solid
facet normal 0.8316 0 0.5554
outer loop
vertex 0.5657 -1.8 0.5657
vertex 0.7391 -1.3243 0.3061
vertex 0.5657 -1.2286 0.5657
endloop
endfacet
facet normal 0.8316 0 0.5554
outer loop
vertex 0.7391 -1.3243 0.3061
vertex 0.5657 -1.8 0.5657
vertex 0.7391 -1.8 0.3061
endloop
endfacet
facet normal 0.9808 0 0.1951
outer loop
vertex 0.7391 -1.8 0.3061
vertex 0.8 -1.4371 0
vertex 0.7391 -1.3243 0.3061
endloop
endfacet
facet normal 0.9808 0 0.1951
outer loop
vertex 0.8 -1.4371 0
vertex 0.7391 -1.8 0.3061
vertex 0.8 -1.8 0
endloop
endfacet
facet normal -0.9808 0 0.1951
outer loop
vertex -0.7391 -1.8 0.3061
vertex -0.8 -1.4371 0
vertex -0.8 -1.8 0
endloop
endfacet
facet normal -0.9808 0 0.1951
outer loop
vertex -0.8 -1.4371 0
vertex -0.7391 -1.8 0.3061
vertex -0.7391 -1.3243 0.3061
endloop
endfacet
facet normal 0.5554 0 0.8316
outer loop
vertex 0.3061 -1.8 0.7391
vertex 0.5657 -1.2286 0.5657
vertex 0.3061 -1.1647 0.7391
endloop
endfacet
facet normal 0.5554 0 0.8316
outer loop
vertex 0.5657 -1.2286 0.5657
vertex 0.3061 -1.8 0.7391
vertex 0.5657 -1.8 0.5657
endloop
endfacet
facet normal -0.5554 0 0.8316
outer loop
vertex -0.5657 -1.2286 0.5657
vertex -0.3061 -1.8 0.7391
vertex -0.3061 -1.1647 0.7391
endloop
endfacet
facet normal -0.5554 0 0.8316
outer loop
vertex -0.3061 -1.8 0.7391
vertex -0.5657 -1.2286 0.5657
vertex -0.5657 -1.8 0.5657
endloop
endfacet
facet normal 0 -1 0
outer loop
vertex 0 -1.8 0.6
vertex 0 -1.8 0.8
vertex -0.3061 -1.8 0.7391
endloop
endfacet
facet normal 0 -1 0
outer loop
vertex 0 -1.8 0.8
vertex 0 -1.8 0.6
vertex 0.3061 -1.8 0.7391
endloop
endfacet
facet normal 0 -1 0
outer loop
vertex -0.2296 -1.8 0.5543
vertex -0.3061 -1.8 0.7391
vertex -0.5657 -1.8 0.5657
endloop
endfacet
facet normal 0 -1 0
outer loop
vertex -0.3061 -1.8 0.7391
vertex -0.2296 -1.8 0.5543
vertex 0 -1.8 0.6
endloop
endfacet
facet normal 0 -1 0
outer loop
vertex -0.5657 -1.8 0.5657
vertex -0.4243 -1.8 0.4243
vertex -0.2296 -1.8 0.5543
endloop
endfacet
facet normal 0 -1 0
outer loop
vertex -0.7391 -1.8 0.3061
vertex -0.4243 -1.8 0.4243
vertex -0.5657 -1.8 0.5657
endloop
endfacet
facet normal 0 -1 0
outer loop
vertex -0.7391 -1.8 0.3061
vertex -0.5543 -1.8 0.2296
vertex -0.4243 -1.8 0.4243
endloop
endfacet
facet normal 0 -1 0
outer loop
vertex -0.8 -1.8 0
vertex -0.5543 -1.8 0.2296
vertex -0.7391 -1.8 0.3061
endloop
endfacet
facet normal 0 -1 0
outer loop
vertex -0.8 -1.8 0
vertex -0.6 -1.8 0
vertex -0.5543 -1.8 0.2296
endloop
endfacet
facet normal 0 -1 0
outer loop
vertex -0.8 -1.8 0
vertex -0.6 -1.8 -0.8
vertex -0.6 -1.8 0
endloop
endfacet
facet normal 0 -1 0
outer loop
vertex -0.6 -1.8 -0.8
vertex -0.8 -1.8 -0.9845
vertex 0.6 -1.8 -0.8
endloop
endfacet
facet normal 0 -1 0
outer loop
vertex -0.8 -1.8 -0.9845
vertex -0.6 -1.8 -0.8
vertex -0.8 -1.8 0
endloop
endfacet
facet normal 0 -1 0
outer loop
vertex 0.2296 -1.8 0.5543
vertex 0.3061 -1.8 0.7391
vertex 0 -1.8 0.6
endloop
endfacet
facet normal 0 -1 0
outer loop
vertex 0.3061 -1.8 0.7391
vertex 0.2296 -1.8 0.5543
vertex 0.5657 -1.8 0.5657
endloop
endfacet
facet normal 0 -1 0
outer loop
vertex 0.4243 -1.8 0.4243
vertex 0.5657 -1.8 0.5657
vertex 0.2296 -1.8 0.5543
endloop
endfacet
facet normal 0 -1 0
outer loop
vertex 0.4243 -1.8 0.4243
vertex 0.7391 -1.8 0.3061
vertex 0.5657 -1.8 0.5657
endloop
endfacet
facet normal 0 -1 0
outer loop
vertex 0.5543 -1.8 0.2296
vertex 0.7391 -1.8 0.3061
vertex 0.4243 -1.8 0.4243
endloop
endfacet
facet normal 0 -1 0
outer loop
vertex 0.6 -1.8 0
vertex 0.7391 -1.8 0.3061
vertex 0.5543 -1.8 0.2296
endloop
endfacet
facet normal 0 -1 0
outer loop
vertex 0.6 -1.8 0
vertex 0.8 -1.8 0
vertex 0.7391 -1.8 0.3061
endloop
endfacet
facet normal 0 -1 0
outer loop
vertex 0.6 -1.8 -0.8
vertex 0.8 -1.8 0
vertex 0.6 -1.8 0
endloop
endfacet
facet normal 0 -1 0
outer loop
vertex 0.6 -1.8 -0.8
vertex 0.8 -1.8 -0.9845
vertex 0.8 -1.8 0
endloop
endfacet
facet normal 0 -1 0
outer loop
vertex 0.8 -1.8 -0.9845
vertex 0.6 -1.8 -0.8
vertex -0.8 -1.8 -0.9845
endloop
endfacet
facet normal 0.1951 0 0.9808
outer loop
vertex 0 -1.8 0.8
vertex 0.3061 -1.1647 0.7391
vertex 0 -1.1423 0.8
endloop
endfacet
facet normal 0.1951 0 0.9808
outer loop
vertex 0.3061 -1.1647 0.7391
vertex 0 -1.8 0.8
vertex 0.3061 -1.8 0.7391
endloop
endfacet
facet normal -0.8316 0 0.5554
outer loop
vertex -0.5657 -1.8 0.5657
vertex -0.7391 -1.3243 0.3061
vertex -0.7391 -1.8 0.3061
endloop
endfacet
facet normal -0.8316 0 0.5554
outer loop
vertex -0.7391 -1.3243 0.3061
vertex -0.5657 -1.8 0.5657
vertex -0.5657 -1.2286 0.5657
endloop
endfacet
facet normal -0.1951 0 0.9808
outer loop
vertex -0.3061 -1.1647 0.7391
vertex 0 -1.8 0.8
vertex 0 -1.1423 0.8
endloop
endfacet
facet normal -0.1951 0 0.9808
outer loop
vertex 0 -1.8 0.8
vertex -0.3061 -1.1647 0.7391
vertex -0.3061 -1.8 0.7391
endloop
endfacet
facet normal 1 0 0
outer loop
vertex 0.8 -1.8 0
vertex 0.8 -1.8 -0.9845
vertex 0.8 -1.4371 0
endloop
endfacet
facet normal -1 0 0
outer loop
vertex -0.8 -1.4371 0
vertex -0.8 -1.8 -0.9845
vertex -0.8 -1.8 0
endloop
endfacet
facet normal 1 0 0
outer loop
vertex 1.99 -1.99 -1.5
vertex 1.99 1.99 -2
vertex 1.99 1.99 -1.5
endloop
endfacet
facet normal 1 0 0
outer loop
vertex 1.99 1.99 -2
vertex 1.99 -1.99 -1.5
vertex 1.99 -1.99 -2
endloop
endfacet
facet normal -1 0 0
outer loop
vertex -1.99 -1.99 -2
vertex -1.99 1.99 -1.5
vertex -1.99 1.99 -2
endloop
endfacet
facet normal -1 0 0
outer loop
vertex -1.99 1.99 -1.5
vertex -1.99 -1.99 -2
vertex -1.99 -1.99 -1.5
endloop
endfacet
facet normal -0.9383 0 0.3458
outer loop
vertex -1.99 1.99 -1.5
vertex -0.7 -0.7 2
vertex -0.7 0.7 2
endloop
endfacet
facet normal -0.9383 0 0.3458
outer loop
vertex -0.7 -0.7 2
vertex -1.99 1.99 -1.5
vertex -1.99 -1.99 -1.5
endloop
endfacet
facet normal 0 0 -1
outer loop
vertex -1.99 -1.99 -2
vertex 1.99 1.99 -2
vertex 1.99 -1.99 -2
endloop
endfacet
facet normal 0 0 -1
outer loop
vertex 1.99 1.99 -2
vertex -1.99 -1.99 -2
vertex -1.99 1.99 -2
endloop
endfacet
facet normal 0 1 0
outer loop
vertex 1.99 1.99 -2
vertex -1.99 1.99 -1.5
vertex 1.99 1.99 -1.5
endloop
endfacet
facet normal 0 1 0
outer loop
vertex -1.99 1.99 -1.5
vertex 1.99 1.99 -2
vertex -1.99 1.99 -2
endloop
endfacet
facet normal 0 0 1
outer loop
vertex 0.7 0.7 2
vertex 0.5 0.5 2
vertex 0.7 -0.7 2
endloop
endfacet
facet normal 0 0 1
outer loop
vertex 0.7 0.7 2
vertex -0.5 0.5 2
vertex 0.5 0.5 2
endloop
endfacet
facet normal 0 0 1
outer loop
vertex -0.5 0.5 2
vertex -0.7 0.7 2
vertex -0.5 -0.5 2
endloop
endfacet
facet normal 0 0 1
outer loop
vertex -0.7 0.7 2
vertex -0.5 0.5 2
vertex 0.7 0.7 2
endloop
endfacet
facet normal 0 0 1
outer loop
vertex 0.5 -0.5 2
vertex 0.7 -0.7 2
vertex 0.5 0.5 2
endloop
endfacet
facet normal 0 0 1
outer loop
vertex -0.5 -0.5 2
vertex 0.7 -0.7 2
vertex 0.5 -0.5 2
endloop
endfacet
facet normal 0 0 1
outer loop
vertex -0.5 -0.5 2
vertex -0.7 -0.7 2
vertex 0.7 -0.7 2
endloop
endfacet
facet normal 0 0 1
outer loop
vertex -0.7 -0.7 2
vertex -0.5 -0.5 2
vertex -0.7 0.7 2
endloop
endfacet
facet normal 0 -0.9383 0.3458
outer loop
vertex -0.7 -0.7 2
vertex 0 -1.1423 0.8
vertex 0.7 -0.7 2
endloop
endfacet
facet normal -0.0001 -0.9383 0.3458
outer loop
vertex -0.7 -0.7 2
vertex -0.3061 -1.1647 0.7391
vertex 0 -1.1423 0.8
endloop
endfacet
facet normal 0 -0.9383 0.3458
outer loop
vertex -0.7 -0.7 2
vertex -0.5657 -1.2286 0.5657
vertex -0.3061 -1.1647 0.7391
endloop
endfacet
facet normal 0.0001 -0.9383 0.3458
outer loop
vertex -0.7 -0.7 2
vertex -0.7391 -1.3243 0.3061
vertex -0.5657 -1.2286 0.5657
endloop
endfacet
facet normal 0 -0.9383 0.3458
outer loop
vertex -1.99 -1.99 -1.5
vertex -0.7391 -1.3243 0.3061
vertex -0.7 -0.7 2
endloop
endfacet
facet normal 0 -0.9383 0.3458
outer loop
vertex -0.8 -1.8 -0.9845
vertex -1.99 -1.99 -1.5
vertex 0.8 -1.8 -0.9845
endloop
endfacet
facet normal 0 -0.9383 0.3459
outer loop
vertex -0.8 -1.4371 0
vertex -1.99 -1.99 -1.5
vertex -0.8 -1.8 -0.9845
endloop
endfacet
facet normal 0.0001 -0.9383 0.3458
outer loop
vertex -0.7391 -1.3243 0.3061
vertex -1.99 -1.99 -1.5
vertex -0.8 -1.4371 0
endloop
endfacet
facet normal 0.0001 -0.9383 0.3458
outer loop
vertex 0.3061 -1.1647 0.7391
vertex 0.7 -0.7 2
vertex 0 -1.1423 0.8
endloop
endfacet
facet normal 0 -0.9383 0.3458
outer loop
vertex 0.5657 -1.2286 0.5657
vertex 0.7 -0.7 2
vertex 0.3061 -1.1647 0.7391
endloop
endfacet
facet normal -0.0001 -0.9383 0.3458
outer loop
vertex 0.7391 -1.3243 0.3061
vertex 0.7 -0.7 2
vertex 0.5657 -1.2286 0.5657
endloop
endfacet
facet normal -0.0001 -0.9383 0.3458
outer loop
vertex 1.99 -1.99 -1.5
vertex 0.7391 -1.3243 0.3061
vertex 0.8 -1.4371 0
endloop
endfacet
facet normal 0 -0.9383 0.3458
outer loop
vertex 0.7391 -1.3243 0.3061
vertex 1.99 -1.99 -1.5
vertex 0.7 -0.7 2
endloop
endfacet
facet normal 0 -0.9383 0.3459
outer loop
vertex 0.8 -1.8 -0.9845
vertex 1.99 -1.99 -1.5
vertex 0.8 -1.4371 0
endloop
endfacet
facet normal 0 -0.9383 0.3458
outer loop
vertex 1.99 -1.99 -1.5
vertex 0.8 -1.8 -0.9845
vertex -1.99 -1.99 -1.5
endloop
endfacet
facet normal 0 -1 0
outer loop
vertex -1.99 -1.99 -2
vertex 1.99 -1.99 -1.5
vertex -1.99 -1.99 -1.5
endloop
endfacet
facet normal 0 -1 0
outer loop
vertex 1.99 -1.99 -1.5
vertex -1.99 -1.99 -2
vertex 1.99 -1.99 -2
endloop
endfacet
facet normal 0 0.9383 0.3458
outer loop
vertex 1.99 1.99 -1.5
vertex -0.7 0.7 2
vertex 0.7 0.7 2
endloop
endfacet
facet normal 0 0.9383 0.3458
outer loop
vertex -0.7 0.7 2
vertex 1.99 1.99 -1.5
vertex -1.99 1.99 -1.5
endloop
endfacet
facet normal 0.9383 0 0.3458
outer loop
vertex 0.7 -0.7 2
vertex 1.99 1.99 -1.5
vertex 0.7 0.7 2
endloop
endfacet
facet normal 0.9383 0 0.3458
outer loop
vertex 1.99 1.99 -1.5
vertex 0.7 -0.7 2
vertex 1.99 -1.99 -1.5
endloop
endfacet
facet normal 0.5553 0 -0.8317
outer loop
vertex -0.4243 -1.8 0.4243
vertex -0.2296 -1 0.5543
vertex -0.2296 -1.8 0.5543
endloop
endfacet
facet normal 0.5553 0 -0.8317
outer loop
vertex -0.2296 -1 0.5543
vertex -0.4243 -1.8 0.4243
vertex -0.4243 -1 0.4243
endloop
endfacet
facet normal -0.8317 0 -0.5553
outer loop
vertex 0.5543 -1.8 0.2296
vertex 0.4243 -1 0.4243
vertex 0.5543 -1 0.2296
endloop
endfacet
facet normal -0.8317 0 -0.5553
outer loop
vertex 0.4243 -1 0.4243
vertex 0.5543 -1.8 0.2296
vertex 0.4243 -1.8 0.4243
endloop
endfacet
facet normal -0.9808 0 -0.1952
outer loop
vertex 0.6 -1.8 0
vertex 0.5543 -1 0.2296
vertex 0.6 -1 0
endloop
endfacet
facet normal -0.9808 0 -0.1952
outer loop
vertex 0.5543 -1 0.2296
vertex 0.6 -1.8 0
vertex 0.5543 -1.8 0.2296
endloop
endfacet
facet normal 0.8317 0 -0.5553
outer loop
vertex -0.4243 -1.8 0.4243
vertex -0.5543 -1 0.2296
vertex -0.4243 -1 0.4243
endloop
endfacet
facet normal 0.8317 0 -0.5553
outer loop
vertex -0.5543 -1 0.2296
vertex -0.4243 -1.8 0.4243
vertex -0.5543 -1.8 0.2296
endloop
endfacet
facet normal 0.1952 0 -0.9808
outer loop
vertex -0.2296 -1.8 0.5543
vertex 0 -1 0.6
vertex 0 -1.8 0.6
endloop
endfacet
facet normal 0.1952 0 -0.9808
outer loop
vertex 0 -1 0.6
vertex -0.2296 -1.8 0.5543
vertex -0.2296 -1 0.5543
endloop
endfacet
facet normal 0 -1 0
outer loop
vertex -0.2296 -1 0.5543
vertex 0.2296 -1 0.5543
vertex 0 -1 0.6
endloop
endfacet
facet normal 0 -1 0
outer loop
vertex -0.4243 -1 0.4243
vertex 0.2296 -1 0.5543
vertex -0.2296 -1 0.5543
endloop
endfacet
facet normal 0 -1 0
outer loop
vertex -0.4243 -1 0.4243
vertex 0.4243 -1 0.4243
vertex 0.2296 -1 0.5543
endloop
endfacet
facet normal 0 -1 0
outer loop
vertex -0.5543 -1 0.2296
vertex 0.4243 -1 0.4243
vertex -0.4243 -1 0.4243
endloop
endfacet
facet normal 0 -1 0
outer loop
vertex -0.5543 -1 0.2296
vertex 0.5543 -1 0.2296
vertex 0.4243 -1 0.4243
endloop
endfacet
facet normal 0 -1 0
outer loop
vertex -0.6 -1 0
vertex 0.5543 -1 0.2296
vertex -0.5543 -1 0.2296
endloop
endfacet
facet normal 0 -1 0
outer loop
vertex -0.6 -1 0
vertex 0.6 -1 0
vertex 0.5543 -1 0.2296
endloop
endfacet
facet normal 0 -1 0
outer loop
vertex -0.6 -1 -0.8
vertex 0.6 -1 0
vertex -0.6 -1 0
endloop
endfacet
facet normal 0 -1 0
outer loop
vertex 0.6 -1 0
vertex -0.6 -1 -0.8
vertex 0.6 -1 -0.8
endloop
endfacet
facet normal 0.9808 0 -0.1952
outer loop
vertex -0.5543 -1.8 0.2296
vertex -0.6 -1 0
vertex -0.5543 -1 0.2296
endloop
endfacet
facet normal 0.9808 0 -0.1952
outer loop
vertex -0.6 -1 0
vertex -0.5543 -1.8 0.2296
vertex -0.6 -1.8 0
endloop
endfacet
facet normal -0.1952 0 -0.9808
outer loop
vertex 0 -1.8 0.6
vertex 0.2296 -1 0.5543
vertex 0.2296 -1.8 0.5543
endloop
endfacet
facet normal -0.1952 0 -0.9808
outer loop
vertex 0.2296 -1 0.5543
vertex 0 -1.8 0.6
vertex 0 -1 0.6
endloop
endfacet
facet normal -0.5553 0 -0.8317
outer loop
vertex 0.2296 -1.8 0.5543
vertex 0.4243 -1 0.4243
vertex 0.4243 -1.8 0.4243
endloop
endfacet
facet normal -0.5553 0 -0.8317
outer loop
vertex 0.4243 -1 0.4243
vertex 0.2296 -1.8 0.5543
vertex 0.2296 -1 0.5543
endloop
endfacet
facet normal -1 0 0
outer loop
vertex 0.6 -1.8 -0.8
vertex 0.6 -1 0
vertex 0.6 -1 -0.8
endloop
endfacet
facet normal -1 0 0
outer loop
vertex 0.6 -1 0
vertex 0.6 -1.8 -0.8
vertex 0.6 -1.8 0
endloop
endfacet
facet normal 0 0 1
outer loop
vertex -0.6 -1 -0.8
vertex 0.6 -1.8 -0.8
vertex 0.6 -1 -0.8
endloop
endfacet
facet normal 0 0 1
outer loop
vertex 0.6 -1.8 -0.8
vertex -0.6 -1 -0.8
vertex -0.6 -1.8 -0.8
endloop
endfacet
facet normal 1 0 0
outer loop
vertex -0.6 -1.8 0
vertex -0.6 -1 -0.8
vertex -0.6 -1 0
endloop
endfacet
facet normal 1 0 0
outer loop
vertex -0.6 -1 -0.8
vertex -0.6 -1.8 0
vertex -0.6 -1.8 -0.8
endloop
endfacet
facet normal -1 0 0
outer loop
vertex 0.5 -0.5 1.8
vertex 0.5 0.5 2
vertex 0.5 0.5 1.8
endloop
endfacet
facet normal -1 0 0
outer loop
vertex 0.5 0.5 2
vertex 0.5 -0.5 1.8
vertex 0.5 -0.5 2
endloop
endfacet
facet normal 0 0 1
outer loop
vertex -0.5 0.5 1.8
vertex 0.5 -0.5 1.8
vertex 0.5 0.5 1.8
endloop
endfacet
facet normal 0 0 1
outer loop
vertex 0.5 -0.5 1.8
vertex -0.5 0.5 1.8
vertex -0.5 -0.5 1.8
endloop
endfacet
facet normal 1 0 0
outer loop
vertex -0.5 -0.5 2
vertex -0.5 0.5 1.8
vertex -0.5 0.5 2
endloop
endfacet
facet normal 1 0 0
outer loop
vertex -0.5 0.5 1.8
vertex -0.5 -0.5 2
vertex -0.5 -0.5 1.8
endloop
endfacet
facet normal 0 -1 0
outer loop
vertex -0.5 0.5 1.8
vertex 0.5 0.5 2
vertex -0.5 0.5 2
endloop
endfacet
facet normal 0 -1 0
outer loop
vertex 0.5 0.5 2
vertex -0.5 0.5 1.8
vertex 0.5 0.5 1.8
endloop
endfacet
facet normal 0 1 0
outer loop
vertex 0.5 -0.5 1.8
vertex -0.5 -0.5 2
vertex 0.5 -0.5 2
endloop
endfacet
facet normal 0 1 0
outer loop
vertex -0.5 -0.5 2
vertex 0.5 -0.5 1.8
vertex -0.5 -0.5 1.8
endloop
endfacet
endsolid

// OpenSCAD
use <lib.scad>

ld = 16;
hd = 64;

bounds = [3.98,3.98,4];

module tunnel() {
	union() {
		rotate([90,0,0]) cyl(0.6,0.6,1);
		translate([0,0,-0.4]) box([1.2, 1, 0.8]);
	}
}

module fire() {
	translate([0,-1.6,0]) intersection() {
		tunnel();
		box([2,0.1,2]);
	}
}

module smoke() {
	translate([0,0,1.8]) box([1,1,0.1]);
}

module pyramidHD() {
	hull() {
		translate([0,0,-bounds.z/2+0.25]) rbox([bounds.x,bounds.y,0.5],0.01,$fn=8);
		translate([0,0,bounds.z/2-0.25]) rbox([1.4,1.4,0.5],0.01,$fn=8);
	}
}

module pyramidLD() {
	hull() {
		translate([0,0,-bounds.z/2+0.25]) box([bounds.x,bounds.y,0.5]);
		translate([0,0,bounds.z/2-0.25]) box([1.4,1.4,0.5]);
	}
}

module furnaceHD() {
	difference() {
		union() {
			difference() {
				pyramidHD();
				intersection() {
					difference() {
						scale(1.01) pyramidHD();
						scale(0.98) pyramidHD();
					}
					for (i = [0:5]) {
						translate([0,0,i/2-1]) box([5,5,0.05]);
					}
				}
			}
			translate([0,-1.3,0]) union() {
				rotate([90,0,0]) cyl(0.8,0.8,1,$fn=hd);
				translate([0,0,-0.8]) box([1.6, 1, 1.6]);
			}
		}
		translate([0,-1.5,0]) tunnel($fn=hd);
		translate([0,0,2.3]) box([1,1,1]);
	}
}

module furnaceLD() {
	difference() {
		union() {
			pyramidLD();
			translate([0,-1.3,0]) union() {
				rotate([90,0,0]) cyl(0.8,0.8,1,$fn=ld);
				translate([0,0,-0.8]) box([1.6, 1, 1.6]);
			}
		}
		translate([0,-1.5,0]) tunnel($fn=ld);
		translate([0,0,2.3]) box([1,1,1]);
	}
}


//furnaceHD();
furnaceLD();
//hull() furnace($fn=ld);
//fire($fn=hd);
//fire($fn=ld);
//smoke($fn=hd);
//smoke($fn=ld);
